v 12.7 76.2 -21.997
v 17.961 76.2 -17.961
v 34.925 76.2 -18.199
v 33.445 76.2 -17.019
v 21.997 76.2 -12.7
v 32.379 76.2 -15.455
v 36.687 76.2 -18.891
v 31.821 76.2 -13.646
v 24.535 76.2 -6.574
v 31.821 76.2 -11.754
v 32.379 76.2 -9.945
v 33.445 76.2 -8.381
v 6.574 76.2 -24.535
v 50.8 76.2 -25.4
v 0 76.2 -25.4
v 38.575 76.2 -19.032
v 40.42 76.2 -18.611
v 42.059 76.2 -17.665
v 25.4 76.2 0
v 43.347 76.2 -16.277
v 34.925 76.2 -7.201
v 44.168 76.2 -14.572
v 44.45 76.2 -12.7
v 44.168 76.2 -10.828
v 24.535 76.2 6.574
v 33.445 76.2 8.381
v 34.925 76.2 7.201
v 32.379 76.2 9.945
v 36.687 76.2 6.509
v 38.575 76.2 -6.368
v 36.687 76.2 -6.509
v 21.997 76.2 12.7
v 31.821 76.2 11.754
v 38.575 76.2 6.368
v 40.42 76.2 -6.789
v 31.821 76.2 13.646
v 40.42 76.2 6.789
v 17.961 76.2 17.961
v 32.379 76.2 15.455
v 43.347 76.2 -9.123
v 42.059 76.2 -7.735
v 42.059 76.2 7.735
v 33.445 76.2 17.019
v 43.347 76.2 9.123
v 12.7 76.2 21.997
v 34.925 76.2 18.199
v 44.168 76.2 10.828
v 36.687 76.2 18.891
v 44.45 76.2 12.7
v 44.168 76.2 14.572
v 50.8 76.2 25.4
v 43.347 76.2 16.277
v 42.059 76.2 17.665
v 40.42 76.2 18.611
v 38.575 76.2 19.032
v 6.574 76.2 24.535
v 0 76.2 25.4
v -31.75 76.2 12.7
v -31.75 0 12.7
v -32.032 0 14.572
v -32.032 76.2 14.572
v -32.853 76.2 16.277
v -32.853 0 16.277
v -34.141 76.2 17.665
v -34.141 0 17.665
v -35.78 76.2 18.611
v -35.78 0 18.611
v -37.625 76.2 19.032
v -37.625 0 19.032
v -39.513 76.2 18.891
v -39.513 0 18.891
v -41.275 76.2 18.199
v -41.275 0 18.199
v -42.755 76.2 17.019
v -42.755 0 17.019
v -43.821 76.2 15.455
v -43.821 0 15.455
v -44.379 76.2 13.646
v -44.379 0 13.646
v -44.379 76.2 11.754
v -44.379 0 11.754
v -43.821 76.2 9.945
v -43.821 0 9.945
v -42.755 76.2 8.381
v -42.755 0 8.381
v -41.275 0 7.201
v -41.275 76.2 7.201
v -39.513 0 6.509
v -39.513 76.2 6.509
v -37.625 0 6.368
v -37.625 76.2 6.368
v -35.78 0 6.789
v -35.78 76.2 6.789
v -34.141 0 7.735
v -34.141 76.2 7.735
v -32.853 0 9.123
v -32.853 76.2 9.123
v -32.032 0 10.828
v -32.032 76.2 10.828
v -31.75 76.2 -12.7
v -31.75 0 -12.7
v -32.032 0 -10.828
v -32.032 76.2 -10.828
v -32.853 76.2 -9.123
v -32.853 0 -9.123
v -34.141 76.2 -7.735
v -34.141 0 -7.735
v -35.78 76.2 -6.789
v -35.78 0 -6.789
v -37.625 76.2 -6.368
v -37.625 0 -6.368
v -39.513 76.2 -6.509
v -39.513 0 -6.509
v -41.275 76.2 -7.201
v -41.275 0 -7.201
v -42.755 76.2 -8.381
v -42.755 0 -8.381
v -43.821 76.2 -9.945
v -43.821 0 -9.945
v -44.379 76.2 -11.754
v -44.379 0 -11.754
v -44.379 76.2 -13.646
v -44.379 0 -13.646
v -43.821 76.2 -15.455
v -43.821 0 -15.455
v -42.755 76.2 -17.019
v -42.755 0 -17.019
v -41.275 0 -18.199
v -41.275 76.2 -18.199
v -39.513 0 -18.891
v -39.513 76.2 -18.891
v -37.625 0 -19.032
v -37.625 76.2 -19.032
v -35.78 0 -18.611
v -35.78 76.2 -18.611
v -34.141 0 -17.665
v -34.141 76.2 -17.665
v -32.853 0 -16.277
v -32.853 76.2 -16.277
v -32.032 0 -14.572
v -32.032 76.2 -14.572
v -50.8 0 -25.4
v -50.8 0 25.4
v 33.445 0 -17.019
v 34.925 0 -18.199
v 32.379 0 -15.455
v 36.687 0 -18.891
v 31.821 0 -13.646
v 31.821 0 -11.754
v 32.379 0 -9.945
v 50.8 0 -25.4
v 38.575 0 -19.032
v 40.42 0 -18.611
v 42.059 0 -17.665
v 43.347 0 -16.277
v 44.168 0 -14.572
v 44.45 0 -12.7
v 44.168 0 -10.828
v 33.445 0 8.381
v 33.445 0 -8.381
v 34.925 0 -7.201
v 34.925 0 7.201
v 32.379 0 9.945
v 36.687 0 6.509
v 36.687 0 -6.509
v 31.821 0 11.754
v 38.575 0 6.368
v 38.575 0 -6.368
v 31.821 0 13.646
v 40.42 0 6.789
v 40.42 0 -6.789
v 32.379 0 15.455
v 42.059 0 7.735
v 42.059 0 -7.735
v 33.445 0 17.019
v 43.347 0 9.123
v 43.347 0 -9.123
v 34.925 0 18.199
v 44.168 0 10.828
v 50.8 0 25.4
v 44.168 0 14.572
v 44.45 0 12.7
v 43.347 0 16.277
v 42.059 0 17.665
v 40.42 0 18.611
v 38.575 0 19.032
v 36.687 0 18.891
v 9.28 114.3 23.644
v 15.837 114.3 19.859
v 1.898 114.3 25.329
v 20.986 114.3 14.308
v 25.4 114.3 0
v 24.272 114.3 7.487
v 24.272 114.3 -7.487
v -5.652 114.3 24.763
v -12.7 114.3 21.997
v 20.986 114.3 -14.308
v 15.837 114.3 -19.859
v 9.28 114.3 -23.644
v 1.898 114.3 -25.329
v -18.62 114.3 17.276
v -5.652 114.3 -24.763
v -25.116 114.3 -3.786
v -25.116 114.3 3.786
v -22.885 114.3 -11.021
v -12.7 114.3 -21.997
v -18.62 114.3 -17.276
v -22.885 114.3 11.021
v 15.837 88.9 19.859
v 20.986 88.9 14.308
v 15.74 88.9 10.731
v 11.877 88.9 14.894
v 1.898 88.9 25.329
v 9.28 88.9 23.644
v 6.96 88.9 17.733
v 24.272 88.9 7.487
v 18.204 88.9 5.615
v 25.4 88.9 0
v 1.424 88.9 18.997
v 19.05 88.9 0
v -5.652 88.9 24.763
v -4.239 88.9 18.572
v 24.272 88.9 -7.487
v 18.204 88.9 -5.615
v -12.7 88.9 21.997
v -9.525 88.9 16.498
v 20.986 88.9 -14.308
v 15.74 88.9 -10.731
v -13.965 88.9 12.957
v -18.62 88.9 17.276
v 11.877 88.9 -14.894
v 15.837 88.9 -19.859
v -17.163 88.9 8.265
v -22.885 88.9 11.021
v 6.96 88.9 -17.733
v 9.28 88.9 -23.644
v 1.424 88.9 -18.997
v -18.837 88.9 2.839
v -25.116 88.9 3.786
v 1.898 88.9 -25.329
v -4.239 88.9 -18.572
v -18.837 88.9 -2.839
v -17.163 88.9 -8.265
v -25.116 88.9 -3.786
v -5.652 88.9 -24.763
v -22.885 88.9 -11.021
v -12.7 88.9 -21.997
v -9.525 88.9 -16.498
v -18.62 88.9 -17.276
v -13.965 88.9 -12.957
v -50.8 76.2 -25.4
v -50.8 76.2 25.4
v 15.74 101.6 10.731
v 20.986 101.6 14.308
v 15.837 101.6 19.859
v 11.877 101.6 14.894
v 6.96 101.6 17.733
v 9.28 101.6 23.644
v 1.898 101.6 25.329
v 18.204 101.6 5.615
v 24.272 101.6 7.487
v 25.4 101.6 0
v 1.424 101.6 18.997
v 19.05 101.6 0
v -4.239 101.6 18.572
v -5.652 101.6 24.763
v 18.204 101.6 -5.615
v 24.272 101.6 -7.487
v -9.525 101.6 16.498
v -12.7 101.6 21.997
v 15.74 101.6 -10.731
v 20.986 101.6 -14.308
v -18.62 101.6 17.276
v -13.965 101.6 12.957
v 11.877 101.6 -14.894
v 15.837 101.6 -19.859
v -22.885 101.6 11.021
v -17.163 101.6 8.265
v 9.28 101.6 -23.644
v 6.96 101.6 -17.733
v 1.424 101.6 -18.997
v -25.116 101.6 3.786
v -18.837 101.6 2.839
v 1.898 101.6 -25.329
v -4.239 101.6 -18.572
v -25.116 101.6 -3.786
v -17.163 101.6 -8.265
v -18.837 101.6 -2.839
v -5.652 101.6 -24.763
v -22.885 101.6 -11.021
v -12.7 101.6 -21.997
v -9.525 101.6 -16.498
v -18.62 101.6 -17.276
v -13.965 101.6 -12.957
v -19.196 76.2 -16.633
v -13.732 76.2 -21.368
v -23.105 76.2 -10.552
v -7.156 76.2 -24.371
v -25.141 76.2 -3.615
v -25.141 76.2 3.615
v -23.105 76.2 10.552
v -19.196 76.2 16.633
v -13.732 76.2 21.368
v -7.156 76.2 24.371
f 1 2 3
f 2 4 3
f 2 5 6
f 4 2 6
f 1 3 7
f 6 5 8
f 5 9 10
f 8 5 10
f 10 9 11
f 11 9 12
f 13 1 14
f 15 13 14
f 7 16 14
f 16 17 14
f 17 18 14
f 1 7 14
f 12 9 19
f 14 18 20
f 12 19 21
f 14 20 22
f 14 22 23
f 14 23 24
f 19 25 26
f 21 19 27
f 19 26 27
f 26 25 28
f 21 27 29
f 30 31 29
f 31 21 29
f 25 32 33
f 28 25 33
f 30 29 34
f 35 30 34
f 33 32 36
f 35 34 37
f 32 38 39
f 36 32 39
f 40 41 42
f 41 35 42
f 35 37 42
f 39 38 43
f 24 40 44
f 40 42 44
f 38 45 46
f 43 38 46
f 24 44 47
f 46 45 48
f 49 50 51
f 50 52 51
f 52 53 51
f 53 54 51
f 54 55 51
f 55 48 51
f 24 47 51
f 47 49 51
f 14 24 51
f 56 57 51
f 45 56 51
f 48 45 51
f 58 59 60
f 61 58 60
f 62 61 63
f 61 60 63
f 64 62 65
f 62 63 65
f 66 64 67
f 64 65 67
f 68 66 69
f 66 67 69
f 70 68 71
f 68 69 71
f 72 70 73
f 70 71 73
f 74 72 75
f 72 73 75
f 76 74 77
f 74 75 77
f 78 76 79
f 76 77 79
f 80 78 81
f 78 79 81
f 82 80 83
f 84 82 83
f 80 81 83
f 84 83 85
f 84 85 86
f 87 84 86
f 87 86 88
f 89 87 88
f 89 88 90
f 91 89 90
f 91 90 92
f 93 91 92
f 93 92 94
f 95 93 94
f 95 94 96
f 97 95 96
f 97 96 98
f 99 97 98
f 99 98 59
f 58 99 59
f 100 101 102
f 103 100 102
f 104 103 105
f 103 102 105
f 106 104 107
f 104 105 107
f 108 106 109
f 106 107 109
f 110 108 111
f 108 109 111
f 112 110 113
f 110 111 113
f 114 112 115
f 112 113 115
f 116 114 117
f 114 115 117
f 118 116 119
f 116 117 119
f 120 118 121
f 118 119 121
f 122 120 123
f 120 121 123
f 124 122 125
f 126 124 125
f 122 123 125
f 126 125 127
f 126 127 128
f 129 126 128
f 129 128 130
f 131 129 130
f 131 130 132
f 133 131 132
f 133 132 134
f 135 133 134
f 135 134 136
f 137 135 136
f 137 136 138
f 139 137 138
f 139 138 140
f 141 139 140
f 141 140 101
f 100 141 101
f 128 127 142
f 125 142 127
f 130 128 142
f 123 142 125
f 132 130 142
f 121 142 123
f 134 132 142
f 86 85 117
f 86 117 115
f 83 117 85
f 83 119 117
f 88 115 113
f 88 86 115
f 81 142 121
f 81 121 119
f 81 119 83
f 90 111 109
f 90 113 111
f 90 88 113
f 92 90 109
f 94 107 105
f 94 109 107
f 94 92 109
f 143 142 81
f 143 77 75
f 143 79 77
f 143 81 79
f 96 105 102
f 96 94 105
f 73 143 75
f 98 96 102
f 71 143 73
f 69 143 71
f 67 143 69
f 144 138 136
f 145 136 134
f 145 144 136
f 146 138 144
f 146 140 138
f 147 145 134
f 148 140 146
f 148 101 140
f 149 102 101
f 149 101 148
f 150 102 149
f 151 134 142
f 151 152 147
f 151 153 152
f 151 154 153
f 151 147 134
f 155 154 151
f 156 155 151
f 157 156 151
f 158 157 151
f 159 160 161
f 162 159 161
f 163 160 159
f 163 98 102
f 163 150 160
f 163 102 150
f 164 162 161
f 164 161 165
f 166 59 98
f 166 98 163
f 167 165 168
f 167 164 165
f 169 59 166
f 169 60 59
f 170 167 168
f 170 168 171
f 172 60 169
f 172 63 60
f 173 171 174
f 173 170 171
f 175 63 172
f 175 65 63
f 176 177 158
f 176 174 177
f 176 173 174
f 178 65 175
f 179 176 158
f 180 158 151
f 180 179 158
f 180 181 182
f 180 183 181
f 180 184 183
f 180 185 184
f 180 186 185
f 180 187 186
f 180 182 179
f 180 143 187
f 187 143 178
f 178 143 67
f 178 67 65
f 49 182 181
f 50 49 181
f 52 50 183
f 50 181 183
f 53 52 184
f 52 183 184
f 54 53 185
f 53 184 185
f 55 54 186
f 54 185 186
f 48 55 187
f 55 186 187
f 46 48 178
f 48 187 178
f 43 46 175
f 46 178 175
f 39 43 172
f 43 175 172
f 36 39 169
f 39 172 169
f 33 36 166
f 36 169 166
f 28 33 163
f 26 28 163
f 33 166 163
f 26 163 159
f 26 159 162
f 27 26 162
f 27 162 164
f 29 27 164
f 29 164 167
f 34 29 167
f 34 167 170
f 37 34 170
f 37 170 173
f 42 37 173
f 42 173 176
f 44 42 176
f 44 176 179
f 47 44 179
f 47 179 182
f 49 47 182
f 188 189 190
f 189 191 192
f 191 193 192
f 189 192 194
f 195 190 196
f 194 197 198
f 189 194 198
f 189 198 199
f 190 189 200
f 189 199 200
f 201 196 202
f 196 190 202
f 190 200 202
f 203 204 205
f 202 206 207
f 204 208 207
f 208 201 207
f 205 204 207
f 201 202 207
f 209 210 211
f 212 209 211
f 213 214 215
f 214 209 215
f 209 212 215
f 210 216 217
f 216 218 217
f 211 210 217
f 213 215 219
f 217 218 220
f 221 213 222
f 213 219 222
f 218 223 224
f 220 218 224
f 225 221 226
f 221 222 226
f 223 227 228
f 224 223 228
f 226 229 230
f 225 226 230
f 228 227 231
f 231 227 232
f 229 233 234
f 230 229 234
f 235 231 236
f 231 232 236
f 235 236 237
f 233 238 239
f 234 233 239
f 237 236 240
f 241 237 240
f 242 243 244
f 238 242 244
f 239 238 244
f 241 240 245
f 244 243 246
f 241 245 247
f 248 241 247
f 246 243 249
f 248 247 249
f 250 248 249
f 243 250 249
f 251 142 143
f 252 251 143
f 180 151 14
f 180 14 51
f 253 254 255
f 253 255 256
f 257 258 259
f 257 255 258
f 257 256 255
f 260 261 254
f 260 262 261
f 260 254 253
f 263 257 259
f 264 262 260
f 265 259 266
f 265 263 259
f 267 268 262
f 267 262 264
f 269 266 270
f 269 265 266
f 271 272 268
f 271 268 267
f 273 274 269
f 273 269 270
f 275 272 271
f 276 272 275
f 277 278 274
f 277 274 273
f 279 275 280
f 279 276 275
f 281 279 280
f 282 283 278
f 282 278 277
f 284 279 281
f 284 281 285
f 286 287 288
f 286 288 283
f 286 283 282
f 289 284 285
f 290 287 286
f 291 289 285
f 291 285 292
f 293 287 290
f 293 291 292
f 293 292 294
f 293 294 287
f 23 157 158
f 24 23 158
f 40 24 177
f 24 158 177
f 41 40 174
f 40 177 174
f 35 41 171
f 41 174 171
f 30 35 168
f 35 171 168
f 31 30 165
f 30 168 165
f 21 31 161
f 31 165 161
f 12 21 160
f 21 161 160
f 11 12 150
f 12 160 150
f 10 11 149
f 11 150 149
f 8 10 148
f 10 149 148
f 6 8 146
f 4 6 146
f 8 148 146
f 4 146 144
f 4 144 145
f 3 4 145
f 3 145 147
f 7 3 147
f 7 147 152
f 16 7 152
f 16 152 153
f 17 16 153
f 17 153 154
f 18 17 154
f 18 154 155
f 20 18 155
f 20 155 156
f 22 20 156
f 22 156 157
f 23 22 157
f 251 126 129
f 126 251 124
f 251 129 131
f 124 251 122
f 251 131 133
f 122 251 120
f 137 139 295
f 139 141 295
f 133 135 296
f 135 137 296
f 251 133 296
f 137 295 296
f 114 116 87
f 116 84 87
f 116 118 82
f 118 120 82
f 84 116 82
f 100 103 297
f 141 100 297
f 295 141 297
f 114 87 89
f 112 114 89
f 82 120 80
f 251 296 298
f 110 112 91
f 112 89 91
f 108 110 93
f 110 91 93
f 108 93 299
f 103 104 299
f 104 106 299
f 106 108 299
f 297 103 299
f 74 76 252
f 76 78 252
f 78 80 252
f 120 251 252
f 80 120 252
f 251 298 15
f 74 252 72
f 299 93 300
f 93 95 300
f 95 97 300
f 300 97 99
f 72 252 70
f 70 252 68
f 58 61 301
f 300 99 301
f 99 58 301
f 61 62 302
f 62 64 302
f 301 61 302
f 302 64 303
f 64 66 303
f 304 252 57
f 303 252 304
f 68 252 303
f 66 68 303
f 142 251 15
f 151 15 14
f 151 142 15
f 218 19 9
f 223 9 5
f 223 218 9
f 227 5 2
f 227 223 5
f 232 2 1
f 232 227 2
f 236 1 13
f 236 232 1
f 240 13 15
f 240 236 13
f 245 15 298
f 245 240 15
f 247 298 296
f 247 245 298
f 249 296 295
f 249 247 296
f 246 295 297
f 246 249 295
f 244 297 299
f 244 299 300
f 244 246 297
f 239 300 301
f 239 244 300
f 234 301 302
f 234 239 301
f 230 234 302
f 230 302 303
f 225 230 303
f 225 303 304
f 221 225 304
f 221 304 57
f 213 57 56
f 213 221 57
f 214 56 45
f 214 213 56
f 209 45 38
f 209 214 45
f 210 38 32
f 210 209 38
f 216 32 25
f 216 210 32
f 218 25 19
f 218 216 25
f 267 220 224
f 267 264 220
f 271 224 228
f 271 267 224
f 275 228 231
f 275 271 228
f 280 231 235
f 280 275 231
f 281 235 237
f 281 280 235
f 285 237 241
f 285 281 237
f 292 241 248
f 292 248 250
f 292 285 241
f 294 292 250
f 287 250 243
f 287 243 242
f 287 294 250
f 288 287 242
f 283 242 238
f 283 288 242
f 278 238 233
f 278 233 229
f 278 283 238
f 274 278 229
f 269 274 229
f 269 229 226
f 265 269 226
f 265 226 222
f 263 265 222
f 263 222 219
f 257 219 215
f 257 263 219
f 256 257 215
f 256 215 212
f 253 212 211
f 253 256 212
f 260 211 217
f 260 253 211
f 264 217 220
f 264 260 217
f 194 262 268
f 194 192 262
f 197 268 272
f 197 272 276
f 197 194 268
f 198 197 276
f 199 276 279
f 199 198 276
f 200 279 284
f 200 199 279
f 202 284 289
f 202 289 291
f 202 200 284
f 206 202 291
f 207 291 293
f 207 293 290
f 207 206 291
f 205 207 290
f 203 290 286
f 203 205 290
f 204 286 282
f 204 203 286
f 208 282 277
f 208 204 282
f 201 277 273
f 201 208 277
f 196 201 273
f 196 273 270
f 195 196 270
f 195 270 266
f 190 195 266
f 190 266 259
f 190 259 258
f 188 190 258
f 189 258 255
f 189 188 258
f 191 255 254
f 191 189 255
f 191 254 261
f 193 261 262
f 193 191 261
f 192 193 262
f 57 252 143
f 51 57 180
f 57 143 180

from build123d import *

# Parameters (mm, degrees)
F0_W     = 101.6
F0_H     = 50.8
F1_DEPTH = 76.2
F2_R     = 6.35
F3_DEPTH = 76.201
F4_W     = 25.4
F4_H     = 38.1
F6_W     = 6.35
F6_H     = 12.7


with BuildPart() as f1:
    # F0 (on Front) → F1 (new body)
    with BuildSketch(Plane.XZ):
        Rectangle(F0_W, F0_H)
    extrude(amount=-F1_DEPTH)

    # F2 (on face) → F3 (cut, through all)
    with BuildSketch(Plane.XZ):
        with Locations((-38.1, 12.7)):
            Circle(F2_R)
        with Locations((-38.1, -12.7)):
            Circle(F2_R)
        with Locations((38.1, -12.7)):
            Circle(F2_R)
        with Locations((38.1, 12.7)):
            Circle(F2_R)
    extrude(amount=-F3_DEPTH, mode=Mode.SUBTRACT)

    # F4 (on Top) → F5 (revolve)
    with BuildSketch(Plane.XY):
        with Locations((12.7, 95.25)):
            Rectangle(F4_W, F4_H)
    revolve(axis=Axis((0, 95.25, 0), (0, 1, 0)))

    # F6 (on Top) → F7 (revolve, cut)
    with BuildSketch(Plane.XY):
        with Locations((22.225, 95.25)):
            Rectangle(F6_W, F6_H)
    revolve(axis=Axis((0, 70.217416, 0), (0, 1, 0)), mode=Mode.SUBTRACT)


solid = f1.part
